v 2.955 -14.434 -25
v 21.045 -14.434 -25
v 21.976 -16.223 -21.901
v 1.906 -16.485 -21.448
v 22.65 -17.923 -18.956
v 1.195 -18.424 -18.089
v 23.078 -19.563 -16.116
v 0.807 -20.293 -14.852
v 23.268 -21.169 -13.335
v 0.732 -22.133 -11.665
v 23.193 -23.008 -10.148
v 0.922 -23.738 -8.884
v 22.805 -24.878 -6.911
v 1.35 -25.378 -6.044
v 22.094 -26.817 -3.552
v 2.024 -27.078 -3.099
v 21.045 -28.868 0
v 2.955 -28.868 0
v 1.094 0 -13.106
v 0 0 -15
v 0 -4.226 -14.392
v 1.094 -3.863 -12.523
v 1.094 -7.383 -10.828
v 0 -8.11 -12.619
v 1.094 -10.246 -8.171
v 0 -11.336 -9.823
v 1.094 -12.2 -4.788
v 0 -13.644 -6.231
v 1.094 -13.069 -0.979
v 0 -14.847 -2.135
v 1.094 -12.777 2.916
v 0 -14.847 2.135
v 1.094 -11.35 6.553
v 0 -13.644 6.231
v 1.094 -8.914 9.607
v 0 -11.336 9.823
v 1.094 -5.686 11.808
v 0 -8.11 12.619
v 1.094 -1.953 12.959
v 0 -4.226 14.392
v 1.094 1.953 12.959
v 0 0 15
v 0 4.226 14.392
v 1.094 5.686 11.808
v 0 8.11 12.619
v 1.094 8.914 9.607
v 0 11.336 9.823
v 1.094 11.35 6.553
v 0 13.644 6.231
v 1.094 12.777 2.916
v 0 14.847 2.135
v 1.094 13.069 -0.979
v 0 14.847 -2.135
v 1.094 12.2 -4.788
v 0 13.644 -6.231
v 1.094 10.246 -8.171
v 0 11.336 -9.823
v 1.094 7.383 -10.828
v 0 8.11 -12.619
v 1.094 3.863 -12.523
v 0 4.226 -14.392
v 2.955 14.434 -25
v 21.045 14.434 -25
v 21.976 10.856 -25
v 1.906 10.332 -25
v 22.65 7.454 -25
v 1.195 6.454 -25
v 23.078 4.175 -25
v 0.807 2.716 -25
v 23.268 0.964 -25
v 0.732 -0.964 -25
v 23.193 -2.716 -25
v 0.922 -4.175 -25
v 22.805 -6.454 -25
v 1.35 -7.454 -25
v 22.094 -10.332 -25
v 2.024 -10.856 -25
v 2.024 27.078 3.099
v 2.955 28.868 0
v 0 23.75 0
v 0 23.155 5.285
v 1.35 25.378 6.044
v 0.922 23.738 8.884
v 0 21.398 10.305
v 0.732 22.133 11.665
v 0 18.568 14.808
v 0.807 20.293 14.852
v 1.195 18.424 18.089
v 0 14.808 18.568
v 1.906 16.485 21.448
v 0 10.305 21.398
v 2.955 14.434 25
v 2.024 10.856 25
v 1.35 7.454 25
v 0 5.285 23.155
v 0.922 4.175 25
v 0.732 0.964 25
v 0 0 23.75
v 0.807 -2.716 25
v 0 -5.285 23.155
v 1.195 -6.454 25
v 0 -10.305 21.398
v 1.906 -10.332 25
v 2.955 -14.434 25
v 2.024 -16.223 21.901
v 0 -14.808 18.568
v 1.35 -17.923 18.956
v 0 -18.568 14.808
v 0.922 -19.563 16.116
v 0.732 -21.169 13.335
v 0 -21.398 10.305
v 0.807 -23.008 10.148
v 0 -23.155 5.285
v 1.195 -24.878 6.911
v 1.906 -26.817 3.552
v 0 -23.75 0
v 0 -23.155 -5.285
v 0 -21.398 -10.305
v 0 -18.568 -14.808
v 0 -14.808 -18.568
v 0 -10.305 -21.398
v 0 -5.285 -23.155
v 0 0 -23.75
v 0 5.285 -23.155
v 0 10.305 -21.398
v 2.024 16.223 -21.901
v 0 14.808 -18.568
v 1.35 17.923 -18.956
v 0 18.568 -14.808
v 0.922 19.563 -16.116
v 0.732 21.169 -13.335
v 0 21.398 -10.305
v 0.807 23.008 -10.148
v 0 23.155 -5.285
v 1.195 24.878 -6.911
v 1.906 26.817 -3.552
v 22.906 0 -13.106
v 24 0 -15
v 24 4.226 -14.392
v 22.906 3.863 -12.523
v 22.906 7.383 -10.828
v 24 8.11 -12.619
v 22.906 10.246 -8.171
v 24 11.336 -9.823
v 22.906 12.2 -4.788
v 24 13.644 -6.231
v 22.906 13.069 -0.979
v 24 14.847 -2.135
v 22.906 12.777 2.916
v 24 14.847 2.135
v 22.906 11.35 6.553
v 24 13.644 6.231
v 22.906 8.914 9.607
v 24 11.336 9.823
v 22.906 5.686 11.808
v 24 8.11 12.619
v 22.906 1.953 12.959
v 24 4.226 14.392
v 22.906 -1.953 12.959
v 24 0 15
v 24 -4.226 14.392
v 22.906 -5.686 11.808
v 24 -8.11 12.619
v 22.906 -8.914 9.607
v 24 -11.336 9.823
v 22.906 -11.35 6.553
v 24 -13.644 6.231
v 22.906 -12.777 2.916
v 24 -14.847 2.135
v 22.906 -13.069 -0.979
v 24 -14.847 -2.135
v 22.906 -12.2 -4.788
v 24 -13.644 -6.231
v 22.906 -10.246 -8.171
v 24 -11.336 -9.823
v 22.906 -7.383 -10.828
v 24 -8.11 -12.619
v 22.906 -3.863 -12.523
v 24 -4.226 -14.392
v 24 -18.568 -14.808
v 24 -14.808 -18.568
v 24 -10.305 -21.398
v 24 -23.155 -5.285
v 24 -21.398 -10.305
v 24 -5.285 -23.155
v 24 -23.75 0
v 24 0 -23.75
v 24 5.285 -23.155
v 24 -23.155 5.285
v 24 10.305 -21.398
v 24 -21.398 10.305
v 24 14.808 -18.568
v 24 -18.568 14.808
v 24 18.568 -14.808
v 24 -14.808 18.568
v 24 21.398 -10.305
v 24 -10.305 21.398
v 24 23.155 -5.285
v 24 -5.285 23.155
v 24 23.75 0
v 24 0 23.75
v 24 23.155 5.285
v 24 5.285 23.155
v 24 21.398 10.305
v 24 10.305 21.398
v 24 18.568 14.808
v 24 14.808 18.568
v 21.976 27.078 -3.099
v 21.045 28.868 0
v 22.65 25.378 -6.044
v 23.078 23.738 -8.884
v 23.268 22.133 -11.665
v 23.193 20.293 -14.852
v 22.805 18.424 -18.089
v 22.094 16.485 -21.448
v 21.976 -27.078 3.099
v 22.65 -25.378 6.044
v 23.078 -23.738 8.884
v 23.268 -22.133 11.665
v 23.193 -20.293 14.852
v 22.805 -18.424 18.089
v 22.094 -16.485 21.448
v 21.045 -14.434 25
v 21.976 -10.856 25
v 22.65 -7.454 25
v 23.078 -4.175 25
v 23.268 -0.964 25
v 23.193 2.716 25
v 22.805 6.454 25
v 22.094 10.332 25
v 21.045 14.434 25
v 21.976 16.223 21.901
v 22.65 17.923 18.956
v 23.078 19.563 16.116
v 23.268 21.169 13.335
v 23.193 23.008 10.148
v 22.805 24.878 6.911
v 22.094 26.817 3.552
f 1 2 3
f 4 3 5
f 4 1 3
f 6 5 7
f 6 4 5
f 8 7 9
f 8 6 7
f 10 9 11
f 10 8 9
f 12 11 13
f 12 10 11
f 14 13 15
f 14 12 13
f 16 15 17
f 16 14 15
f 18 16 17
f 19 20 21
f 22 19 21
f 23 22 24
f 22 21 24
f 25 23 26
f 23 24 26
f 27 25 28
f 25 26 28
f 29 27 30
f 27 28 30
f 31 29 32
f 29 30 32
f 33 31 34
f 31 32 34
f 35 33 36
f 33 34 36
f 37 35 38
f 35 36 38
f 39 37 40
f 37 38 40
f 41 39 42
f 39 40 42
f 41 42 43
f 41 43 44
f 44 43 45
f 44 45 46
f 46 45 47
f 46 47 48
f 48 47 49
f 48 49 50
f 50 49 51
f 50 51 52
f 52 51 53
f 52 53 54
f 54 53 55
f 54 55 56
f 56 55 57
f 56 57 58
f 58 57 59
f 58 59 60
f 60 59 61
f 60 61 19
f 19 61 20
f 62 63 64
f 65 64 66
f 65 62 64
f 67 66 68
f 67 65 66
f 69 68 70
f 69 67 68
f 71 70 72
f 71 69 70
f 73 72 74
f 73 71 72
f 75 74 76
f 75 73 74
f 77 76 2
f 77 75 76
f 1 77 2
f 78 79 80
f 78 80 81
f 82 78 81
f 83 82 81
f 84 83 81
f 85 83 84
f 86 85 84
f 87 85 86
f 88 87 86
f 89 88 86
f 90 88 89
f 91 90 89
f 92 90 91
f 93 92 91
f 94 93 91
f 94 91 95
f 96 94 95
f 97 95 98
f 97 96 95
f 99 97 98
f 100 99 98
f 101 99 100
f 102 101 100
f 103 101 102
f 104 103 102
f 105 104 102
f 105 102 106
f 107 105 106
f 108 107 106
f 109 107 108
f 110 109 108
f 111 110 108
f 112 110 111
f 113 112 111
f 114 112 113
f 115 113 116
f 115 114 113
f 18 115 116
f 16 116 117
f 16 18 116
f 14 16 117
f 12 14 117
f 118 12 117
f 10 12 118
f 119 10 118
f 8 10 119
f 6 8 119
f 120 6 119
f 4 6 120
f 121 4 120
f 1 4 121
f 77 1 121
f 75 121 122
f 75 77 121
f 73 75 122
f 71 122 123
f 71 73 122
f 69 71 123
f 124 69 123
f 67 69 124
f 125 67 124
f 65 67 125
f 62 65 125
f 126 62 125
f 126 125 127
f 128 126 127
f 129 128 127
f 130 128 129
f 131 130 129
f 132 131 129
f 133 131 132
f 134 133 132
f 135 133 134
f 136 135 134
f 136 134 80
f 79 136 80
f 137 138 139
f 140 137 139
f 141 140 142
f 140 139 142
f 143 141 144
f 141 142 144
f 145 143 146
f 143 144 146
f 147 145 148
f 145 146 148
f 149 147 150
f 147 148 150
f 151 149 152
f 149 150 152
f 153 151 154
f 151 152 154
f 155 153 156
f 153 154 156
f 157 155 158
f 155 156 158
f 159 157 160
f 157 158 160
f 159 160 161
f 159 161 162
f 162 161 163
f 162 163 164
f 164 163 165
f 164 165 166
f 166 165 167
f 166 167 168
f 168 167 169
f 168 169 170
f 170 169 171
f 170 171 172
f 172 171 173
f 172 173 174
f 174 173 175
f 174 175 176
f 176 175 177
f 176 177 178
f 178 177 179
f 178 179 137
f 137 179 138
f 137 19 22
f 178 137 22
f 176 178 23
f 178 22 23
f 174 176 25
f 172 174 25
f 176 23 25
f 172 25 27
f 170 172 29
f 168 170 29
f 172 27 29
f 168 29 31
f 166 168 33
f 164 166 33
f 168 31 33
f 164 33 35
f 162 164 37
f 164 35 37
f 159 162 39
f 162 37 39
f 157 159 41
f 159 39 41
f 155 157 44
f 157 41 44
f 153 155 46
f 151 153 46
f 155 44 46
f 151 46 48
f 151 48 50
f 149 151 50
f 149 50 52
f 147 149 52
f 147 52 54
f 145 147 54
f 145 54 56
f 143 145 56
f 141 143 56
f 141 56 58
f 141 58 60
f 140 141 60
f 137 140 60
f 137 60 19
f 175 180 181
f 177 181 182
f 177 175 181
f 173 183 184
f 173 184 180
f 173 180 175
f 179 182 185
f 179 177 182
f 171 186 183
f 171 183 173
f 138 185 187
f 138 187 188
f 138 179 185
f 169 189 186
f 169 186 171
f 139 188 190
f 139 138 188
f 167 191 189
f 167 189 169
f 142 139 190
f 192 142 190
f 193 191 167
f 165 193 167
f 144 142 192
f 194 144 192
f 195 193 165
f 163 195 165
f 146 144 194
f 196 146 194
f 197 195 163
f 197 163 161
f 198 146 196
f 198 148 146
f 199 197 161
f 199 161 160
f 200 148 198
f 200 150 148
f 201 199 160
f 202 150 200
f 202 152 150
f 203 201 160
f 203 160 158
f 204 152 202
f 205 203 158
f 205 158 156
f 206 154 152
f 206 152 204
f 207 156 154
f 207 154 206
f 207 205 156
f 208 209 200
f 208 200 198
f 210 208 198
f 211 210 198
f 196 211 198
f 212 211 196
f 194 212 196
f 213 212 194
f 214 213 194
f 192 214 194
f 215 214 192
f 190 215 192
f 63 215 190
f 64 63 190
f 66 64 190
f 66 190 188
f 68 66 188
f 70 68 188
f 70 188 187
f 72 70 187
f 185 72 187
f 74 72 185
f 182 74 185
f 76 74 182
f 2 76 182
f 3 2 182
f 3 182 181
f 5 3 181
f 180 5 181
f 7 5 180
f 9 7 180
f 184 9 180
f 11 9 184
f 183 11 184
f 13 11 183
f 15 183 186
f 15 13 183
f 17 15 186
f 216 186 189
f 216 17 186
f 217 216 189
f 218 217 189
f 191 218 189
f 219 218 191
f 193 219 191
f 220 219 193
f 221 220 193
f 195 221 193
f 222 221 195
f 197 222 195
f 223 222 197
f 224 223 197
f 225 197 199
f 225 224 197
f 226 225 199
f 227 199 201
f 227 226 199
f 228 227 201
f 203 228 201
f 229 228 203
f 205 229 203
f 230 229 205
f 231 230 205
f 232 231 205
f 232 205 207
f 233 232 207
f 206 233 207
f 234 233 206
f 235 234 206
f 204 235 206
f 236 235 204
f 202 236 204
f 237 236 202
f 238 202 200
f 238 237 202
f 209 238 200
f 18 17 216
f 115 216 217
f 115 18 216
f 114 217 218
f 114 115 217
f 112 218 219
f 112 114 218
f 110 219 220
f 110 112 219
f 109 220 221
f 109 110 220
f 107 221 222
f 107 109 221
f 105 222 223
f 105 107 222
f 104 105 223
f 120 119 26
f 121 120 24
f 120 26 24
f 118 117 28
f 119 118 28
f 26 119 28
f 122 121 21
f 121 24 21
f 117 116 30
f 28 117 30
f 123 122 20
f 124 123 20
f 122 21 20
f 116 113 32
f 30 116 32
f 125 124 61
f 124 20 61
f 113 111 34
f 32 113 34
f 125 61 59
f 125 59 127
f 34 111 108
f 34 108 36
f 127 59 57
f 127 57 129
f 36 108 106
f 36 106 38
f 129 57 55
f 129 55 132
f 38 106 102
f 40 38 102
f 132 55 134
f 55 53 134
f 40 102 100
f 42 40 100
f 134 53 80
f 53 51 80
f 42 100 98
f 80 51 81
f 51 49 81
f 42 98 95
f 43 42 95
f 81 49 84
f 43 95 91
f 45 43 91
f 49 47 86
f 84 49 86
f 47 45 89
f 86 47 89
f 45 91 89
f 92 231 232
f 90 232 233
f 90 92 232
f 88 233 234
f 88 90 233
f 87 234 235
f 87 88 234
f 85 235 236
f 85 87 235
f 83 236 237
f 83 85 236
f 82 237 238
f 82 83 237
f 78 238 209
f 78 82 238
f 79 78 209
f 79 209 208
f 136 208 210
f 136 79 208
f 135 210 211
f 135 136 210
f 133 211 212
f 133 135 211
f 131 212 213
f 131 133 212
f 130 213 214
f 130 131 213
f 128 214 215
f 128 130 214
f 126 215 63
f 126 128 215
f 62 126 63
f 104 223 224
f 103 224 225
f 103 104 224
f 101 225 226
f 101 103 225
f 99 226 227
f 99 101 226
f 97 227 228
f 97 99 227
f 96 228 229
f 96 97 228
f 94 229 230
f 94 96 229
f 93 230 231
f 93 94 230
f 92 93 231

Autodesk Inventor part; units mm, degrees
ref_plane "YZ Plane" through (0, 0, 0) normal (1, 0, 0) x (0, 1, 0)
ref_plane "XZ Plane" through (0, 0, 0) normal (0, 1, 0) x (-1, 0, 0)
sketch "Sketch1" plane through (0, 0, 0) normal (1, 0, 0) x (0, 1, 0)
  line L0 (-28.8675, 0) -> (-14.4338, 25)
  line L1 (-14.4338, 25) -> (14.4338, 25)
  line L2 (14.4338, 25) -> (28.8675, 0)
  line L3 (28.8675, 0) -> (14.4338, -25)
  line L4 (14.4338, -25) -> (-14.4338, -25)
  line L5 (-14.4338, -25) -> (-28.8675, 0)
  point P0 (0, 0)
  point P1 (0, 0)
  dimension "d0" = 57.735
extrude "Body" add sketch "Sketch1" along normal blind 24
sketch "Sketch2" plane through (0, 0, 0) normal (0, 0, 1) x (1, 0, 0)
  line L0 (0, 14.4338) -> (0, 28.8675) projected
  line L1 (0, 28.8675) -> (24, 28.8675) projected
  line L2 (24, 14.4338) -> (24, 28.8675) projected
  line L3 (-4.8, 0) -> (28.8, 0) projected
  line L4 (2.9546, 28.8675) -> (0, 23.75)
  line L5 (21.0454, 28.8675) -> (24, 23.75)
  dimension "d3" = 30
  dimension "d4" = 30
  dimension "d5" = 47.5
  dimension "d6" = 47.5
revolve "Chamfer1" cut sketch "Sketch2" angle 360 about axis through (-10, 0, 0) along (1, 0, 0)
sketch "Sketch3" plane through (24, 0, 0) normal (1, 0, 0) x (0, 0, -1)
  arc A0 (-0.625, -1.0825) -> (0.625, -1.0825) centre (0, 0) ccw projected
hole "Thread" at (24, 0, 0) direction (-1, 0, 0) diameter 26.211 end through all thread size "M30x3.5" class "6H" standard "ISO Metric profile"
chamfer "Chamfer2" distance 1.8944 angle 30 1 edges at (24, 0, 13.1055) measured on face at (24, 19.9399, -2.4211)
chamfer "Chamfer3" distance 1.8944 angle 30 1 edges at (0, 0, 13.1055) measured on face at (0, 19.9399, -2.4211)
ref_plane "Work Plane1" through (-56.8181, 0, 0) normal (0, -0.8660254, -0.5) x (1, 0, 0)
equation "\"d0\" = 1.1547 * SW"
equation "\"d1\" = KOH"
equation "\"d3\" = ANG1"
equation "\"d4\" = ANG2"
equation "\"d5\" = SW0"
equation "\"d6\" = SW01"
equation "\"d8\" = -0.5 * GD1 + 0.5 * NND"
equation "\"d40\" = -0.5 * GD1 + 0.5 * NND"
equation "\"d10\" = -0.5 * GD1 + 0.5 * NND"
equation "\"d41\" = -0.5 * GD1 + 0.5 * NND"
equation "\"ANG1\" = 30deg"
equation "\"ANG2\" = 30deg"
equation "\"KOH\" = 24"
equation "\"SW0\" = 47.5"
equation "\"SW01\" = SW0"
equation "\"GUL\" = 0.541266 * PTC"
equation "\"TOA\" = 30deg"
equation "\"PTC\" = 3.5"
equation "\"E0\" = 1.155 * SW"
equation "\"GAL\" = 0.541266 * PTC"
equation "\"Mw\" = 18.16"
equation "\"SW\" = 50"
equation "\"GD1\" = 26.211139"
equation "\"NND\" = 30"
properties part number "DIN 6915 - M30" material "Steel ASTM 194 2H"
